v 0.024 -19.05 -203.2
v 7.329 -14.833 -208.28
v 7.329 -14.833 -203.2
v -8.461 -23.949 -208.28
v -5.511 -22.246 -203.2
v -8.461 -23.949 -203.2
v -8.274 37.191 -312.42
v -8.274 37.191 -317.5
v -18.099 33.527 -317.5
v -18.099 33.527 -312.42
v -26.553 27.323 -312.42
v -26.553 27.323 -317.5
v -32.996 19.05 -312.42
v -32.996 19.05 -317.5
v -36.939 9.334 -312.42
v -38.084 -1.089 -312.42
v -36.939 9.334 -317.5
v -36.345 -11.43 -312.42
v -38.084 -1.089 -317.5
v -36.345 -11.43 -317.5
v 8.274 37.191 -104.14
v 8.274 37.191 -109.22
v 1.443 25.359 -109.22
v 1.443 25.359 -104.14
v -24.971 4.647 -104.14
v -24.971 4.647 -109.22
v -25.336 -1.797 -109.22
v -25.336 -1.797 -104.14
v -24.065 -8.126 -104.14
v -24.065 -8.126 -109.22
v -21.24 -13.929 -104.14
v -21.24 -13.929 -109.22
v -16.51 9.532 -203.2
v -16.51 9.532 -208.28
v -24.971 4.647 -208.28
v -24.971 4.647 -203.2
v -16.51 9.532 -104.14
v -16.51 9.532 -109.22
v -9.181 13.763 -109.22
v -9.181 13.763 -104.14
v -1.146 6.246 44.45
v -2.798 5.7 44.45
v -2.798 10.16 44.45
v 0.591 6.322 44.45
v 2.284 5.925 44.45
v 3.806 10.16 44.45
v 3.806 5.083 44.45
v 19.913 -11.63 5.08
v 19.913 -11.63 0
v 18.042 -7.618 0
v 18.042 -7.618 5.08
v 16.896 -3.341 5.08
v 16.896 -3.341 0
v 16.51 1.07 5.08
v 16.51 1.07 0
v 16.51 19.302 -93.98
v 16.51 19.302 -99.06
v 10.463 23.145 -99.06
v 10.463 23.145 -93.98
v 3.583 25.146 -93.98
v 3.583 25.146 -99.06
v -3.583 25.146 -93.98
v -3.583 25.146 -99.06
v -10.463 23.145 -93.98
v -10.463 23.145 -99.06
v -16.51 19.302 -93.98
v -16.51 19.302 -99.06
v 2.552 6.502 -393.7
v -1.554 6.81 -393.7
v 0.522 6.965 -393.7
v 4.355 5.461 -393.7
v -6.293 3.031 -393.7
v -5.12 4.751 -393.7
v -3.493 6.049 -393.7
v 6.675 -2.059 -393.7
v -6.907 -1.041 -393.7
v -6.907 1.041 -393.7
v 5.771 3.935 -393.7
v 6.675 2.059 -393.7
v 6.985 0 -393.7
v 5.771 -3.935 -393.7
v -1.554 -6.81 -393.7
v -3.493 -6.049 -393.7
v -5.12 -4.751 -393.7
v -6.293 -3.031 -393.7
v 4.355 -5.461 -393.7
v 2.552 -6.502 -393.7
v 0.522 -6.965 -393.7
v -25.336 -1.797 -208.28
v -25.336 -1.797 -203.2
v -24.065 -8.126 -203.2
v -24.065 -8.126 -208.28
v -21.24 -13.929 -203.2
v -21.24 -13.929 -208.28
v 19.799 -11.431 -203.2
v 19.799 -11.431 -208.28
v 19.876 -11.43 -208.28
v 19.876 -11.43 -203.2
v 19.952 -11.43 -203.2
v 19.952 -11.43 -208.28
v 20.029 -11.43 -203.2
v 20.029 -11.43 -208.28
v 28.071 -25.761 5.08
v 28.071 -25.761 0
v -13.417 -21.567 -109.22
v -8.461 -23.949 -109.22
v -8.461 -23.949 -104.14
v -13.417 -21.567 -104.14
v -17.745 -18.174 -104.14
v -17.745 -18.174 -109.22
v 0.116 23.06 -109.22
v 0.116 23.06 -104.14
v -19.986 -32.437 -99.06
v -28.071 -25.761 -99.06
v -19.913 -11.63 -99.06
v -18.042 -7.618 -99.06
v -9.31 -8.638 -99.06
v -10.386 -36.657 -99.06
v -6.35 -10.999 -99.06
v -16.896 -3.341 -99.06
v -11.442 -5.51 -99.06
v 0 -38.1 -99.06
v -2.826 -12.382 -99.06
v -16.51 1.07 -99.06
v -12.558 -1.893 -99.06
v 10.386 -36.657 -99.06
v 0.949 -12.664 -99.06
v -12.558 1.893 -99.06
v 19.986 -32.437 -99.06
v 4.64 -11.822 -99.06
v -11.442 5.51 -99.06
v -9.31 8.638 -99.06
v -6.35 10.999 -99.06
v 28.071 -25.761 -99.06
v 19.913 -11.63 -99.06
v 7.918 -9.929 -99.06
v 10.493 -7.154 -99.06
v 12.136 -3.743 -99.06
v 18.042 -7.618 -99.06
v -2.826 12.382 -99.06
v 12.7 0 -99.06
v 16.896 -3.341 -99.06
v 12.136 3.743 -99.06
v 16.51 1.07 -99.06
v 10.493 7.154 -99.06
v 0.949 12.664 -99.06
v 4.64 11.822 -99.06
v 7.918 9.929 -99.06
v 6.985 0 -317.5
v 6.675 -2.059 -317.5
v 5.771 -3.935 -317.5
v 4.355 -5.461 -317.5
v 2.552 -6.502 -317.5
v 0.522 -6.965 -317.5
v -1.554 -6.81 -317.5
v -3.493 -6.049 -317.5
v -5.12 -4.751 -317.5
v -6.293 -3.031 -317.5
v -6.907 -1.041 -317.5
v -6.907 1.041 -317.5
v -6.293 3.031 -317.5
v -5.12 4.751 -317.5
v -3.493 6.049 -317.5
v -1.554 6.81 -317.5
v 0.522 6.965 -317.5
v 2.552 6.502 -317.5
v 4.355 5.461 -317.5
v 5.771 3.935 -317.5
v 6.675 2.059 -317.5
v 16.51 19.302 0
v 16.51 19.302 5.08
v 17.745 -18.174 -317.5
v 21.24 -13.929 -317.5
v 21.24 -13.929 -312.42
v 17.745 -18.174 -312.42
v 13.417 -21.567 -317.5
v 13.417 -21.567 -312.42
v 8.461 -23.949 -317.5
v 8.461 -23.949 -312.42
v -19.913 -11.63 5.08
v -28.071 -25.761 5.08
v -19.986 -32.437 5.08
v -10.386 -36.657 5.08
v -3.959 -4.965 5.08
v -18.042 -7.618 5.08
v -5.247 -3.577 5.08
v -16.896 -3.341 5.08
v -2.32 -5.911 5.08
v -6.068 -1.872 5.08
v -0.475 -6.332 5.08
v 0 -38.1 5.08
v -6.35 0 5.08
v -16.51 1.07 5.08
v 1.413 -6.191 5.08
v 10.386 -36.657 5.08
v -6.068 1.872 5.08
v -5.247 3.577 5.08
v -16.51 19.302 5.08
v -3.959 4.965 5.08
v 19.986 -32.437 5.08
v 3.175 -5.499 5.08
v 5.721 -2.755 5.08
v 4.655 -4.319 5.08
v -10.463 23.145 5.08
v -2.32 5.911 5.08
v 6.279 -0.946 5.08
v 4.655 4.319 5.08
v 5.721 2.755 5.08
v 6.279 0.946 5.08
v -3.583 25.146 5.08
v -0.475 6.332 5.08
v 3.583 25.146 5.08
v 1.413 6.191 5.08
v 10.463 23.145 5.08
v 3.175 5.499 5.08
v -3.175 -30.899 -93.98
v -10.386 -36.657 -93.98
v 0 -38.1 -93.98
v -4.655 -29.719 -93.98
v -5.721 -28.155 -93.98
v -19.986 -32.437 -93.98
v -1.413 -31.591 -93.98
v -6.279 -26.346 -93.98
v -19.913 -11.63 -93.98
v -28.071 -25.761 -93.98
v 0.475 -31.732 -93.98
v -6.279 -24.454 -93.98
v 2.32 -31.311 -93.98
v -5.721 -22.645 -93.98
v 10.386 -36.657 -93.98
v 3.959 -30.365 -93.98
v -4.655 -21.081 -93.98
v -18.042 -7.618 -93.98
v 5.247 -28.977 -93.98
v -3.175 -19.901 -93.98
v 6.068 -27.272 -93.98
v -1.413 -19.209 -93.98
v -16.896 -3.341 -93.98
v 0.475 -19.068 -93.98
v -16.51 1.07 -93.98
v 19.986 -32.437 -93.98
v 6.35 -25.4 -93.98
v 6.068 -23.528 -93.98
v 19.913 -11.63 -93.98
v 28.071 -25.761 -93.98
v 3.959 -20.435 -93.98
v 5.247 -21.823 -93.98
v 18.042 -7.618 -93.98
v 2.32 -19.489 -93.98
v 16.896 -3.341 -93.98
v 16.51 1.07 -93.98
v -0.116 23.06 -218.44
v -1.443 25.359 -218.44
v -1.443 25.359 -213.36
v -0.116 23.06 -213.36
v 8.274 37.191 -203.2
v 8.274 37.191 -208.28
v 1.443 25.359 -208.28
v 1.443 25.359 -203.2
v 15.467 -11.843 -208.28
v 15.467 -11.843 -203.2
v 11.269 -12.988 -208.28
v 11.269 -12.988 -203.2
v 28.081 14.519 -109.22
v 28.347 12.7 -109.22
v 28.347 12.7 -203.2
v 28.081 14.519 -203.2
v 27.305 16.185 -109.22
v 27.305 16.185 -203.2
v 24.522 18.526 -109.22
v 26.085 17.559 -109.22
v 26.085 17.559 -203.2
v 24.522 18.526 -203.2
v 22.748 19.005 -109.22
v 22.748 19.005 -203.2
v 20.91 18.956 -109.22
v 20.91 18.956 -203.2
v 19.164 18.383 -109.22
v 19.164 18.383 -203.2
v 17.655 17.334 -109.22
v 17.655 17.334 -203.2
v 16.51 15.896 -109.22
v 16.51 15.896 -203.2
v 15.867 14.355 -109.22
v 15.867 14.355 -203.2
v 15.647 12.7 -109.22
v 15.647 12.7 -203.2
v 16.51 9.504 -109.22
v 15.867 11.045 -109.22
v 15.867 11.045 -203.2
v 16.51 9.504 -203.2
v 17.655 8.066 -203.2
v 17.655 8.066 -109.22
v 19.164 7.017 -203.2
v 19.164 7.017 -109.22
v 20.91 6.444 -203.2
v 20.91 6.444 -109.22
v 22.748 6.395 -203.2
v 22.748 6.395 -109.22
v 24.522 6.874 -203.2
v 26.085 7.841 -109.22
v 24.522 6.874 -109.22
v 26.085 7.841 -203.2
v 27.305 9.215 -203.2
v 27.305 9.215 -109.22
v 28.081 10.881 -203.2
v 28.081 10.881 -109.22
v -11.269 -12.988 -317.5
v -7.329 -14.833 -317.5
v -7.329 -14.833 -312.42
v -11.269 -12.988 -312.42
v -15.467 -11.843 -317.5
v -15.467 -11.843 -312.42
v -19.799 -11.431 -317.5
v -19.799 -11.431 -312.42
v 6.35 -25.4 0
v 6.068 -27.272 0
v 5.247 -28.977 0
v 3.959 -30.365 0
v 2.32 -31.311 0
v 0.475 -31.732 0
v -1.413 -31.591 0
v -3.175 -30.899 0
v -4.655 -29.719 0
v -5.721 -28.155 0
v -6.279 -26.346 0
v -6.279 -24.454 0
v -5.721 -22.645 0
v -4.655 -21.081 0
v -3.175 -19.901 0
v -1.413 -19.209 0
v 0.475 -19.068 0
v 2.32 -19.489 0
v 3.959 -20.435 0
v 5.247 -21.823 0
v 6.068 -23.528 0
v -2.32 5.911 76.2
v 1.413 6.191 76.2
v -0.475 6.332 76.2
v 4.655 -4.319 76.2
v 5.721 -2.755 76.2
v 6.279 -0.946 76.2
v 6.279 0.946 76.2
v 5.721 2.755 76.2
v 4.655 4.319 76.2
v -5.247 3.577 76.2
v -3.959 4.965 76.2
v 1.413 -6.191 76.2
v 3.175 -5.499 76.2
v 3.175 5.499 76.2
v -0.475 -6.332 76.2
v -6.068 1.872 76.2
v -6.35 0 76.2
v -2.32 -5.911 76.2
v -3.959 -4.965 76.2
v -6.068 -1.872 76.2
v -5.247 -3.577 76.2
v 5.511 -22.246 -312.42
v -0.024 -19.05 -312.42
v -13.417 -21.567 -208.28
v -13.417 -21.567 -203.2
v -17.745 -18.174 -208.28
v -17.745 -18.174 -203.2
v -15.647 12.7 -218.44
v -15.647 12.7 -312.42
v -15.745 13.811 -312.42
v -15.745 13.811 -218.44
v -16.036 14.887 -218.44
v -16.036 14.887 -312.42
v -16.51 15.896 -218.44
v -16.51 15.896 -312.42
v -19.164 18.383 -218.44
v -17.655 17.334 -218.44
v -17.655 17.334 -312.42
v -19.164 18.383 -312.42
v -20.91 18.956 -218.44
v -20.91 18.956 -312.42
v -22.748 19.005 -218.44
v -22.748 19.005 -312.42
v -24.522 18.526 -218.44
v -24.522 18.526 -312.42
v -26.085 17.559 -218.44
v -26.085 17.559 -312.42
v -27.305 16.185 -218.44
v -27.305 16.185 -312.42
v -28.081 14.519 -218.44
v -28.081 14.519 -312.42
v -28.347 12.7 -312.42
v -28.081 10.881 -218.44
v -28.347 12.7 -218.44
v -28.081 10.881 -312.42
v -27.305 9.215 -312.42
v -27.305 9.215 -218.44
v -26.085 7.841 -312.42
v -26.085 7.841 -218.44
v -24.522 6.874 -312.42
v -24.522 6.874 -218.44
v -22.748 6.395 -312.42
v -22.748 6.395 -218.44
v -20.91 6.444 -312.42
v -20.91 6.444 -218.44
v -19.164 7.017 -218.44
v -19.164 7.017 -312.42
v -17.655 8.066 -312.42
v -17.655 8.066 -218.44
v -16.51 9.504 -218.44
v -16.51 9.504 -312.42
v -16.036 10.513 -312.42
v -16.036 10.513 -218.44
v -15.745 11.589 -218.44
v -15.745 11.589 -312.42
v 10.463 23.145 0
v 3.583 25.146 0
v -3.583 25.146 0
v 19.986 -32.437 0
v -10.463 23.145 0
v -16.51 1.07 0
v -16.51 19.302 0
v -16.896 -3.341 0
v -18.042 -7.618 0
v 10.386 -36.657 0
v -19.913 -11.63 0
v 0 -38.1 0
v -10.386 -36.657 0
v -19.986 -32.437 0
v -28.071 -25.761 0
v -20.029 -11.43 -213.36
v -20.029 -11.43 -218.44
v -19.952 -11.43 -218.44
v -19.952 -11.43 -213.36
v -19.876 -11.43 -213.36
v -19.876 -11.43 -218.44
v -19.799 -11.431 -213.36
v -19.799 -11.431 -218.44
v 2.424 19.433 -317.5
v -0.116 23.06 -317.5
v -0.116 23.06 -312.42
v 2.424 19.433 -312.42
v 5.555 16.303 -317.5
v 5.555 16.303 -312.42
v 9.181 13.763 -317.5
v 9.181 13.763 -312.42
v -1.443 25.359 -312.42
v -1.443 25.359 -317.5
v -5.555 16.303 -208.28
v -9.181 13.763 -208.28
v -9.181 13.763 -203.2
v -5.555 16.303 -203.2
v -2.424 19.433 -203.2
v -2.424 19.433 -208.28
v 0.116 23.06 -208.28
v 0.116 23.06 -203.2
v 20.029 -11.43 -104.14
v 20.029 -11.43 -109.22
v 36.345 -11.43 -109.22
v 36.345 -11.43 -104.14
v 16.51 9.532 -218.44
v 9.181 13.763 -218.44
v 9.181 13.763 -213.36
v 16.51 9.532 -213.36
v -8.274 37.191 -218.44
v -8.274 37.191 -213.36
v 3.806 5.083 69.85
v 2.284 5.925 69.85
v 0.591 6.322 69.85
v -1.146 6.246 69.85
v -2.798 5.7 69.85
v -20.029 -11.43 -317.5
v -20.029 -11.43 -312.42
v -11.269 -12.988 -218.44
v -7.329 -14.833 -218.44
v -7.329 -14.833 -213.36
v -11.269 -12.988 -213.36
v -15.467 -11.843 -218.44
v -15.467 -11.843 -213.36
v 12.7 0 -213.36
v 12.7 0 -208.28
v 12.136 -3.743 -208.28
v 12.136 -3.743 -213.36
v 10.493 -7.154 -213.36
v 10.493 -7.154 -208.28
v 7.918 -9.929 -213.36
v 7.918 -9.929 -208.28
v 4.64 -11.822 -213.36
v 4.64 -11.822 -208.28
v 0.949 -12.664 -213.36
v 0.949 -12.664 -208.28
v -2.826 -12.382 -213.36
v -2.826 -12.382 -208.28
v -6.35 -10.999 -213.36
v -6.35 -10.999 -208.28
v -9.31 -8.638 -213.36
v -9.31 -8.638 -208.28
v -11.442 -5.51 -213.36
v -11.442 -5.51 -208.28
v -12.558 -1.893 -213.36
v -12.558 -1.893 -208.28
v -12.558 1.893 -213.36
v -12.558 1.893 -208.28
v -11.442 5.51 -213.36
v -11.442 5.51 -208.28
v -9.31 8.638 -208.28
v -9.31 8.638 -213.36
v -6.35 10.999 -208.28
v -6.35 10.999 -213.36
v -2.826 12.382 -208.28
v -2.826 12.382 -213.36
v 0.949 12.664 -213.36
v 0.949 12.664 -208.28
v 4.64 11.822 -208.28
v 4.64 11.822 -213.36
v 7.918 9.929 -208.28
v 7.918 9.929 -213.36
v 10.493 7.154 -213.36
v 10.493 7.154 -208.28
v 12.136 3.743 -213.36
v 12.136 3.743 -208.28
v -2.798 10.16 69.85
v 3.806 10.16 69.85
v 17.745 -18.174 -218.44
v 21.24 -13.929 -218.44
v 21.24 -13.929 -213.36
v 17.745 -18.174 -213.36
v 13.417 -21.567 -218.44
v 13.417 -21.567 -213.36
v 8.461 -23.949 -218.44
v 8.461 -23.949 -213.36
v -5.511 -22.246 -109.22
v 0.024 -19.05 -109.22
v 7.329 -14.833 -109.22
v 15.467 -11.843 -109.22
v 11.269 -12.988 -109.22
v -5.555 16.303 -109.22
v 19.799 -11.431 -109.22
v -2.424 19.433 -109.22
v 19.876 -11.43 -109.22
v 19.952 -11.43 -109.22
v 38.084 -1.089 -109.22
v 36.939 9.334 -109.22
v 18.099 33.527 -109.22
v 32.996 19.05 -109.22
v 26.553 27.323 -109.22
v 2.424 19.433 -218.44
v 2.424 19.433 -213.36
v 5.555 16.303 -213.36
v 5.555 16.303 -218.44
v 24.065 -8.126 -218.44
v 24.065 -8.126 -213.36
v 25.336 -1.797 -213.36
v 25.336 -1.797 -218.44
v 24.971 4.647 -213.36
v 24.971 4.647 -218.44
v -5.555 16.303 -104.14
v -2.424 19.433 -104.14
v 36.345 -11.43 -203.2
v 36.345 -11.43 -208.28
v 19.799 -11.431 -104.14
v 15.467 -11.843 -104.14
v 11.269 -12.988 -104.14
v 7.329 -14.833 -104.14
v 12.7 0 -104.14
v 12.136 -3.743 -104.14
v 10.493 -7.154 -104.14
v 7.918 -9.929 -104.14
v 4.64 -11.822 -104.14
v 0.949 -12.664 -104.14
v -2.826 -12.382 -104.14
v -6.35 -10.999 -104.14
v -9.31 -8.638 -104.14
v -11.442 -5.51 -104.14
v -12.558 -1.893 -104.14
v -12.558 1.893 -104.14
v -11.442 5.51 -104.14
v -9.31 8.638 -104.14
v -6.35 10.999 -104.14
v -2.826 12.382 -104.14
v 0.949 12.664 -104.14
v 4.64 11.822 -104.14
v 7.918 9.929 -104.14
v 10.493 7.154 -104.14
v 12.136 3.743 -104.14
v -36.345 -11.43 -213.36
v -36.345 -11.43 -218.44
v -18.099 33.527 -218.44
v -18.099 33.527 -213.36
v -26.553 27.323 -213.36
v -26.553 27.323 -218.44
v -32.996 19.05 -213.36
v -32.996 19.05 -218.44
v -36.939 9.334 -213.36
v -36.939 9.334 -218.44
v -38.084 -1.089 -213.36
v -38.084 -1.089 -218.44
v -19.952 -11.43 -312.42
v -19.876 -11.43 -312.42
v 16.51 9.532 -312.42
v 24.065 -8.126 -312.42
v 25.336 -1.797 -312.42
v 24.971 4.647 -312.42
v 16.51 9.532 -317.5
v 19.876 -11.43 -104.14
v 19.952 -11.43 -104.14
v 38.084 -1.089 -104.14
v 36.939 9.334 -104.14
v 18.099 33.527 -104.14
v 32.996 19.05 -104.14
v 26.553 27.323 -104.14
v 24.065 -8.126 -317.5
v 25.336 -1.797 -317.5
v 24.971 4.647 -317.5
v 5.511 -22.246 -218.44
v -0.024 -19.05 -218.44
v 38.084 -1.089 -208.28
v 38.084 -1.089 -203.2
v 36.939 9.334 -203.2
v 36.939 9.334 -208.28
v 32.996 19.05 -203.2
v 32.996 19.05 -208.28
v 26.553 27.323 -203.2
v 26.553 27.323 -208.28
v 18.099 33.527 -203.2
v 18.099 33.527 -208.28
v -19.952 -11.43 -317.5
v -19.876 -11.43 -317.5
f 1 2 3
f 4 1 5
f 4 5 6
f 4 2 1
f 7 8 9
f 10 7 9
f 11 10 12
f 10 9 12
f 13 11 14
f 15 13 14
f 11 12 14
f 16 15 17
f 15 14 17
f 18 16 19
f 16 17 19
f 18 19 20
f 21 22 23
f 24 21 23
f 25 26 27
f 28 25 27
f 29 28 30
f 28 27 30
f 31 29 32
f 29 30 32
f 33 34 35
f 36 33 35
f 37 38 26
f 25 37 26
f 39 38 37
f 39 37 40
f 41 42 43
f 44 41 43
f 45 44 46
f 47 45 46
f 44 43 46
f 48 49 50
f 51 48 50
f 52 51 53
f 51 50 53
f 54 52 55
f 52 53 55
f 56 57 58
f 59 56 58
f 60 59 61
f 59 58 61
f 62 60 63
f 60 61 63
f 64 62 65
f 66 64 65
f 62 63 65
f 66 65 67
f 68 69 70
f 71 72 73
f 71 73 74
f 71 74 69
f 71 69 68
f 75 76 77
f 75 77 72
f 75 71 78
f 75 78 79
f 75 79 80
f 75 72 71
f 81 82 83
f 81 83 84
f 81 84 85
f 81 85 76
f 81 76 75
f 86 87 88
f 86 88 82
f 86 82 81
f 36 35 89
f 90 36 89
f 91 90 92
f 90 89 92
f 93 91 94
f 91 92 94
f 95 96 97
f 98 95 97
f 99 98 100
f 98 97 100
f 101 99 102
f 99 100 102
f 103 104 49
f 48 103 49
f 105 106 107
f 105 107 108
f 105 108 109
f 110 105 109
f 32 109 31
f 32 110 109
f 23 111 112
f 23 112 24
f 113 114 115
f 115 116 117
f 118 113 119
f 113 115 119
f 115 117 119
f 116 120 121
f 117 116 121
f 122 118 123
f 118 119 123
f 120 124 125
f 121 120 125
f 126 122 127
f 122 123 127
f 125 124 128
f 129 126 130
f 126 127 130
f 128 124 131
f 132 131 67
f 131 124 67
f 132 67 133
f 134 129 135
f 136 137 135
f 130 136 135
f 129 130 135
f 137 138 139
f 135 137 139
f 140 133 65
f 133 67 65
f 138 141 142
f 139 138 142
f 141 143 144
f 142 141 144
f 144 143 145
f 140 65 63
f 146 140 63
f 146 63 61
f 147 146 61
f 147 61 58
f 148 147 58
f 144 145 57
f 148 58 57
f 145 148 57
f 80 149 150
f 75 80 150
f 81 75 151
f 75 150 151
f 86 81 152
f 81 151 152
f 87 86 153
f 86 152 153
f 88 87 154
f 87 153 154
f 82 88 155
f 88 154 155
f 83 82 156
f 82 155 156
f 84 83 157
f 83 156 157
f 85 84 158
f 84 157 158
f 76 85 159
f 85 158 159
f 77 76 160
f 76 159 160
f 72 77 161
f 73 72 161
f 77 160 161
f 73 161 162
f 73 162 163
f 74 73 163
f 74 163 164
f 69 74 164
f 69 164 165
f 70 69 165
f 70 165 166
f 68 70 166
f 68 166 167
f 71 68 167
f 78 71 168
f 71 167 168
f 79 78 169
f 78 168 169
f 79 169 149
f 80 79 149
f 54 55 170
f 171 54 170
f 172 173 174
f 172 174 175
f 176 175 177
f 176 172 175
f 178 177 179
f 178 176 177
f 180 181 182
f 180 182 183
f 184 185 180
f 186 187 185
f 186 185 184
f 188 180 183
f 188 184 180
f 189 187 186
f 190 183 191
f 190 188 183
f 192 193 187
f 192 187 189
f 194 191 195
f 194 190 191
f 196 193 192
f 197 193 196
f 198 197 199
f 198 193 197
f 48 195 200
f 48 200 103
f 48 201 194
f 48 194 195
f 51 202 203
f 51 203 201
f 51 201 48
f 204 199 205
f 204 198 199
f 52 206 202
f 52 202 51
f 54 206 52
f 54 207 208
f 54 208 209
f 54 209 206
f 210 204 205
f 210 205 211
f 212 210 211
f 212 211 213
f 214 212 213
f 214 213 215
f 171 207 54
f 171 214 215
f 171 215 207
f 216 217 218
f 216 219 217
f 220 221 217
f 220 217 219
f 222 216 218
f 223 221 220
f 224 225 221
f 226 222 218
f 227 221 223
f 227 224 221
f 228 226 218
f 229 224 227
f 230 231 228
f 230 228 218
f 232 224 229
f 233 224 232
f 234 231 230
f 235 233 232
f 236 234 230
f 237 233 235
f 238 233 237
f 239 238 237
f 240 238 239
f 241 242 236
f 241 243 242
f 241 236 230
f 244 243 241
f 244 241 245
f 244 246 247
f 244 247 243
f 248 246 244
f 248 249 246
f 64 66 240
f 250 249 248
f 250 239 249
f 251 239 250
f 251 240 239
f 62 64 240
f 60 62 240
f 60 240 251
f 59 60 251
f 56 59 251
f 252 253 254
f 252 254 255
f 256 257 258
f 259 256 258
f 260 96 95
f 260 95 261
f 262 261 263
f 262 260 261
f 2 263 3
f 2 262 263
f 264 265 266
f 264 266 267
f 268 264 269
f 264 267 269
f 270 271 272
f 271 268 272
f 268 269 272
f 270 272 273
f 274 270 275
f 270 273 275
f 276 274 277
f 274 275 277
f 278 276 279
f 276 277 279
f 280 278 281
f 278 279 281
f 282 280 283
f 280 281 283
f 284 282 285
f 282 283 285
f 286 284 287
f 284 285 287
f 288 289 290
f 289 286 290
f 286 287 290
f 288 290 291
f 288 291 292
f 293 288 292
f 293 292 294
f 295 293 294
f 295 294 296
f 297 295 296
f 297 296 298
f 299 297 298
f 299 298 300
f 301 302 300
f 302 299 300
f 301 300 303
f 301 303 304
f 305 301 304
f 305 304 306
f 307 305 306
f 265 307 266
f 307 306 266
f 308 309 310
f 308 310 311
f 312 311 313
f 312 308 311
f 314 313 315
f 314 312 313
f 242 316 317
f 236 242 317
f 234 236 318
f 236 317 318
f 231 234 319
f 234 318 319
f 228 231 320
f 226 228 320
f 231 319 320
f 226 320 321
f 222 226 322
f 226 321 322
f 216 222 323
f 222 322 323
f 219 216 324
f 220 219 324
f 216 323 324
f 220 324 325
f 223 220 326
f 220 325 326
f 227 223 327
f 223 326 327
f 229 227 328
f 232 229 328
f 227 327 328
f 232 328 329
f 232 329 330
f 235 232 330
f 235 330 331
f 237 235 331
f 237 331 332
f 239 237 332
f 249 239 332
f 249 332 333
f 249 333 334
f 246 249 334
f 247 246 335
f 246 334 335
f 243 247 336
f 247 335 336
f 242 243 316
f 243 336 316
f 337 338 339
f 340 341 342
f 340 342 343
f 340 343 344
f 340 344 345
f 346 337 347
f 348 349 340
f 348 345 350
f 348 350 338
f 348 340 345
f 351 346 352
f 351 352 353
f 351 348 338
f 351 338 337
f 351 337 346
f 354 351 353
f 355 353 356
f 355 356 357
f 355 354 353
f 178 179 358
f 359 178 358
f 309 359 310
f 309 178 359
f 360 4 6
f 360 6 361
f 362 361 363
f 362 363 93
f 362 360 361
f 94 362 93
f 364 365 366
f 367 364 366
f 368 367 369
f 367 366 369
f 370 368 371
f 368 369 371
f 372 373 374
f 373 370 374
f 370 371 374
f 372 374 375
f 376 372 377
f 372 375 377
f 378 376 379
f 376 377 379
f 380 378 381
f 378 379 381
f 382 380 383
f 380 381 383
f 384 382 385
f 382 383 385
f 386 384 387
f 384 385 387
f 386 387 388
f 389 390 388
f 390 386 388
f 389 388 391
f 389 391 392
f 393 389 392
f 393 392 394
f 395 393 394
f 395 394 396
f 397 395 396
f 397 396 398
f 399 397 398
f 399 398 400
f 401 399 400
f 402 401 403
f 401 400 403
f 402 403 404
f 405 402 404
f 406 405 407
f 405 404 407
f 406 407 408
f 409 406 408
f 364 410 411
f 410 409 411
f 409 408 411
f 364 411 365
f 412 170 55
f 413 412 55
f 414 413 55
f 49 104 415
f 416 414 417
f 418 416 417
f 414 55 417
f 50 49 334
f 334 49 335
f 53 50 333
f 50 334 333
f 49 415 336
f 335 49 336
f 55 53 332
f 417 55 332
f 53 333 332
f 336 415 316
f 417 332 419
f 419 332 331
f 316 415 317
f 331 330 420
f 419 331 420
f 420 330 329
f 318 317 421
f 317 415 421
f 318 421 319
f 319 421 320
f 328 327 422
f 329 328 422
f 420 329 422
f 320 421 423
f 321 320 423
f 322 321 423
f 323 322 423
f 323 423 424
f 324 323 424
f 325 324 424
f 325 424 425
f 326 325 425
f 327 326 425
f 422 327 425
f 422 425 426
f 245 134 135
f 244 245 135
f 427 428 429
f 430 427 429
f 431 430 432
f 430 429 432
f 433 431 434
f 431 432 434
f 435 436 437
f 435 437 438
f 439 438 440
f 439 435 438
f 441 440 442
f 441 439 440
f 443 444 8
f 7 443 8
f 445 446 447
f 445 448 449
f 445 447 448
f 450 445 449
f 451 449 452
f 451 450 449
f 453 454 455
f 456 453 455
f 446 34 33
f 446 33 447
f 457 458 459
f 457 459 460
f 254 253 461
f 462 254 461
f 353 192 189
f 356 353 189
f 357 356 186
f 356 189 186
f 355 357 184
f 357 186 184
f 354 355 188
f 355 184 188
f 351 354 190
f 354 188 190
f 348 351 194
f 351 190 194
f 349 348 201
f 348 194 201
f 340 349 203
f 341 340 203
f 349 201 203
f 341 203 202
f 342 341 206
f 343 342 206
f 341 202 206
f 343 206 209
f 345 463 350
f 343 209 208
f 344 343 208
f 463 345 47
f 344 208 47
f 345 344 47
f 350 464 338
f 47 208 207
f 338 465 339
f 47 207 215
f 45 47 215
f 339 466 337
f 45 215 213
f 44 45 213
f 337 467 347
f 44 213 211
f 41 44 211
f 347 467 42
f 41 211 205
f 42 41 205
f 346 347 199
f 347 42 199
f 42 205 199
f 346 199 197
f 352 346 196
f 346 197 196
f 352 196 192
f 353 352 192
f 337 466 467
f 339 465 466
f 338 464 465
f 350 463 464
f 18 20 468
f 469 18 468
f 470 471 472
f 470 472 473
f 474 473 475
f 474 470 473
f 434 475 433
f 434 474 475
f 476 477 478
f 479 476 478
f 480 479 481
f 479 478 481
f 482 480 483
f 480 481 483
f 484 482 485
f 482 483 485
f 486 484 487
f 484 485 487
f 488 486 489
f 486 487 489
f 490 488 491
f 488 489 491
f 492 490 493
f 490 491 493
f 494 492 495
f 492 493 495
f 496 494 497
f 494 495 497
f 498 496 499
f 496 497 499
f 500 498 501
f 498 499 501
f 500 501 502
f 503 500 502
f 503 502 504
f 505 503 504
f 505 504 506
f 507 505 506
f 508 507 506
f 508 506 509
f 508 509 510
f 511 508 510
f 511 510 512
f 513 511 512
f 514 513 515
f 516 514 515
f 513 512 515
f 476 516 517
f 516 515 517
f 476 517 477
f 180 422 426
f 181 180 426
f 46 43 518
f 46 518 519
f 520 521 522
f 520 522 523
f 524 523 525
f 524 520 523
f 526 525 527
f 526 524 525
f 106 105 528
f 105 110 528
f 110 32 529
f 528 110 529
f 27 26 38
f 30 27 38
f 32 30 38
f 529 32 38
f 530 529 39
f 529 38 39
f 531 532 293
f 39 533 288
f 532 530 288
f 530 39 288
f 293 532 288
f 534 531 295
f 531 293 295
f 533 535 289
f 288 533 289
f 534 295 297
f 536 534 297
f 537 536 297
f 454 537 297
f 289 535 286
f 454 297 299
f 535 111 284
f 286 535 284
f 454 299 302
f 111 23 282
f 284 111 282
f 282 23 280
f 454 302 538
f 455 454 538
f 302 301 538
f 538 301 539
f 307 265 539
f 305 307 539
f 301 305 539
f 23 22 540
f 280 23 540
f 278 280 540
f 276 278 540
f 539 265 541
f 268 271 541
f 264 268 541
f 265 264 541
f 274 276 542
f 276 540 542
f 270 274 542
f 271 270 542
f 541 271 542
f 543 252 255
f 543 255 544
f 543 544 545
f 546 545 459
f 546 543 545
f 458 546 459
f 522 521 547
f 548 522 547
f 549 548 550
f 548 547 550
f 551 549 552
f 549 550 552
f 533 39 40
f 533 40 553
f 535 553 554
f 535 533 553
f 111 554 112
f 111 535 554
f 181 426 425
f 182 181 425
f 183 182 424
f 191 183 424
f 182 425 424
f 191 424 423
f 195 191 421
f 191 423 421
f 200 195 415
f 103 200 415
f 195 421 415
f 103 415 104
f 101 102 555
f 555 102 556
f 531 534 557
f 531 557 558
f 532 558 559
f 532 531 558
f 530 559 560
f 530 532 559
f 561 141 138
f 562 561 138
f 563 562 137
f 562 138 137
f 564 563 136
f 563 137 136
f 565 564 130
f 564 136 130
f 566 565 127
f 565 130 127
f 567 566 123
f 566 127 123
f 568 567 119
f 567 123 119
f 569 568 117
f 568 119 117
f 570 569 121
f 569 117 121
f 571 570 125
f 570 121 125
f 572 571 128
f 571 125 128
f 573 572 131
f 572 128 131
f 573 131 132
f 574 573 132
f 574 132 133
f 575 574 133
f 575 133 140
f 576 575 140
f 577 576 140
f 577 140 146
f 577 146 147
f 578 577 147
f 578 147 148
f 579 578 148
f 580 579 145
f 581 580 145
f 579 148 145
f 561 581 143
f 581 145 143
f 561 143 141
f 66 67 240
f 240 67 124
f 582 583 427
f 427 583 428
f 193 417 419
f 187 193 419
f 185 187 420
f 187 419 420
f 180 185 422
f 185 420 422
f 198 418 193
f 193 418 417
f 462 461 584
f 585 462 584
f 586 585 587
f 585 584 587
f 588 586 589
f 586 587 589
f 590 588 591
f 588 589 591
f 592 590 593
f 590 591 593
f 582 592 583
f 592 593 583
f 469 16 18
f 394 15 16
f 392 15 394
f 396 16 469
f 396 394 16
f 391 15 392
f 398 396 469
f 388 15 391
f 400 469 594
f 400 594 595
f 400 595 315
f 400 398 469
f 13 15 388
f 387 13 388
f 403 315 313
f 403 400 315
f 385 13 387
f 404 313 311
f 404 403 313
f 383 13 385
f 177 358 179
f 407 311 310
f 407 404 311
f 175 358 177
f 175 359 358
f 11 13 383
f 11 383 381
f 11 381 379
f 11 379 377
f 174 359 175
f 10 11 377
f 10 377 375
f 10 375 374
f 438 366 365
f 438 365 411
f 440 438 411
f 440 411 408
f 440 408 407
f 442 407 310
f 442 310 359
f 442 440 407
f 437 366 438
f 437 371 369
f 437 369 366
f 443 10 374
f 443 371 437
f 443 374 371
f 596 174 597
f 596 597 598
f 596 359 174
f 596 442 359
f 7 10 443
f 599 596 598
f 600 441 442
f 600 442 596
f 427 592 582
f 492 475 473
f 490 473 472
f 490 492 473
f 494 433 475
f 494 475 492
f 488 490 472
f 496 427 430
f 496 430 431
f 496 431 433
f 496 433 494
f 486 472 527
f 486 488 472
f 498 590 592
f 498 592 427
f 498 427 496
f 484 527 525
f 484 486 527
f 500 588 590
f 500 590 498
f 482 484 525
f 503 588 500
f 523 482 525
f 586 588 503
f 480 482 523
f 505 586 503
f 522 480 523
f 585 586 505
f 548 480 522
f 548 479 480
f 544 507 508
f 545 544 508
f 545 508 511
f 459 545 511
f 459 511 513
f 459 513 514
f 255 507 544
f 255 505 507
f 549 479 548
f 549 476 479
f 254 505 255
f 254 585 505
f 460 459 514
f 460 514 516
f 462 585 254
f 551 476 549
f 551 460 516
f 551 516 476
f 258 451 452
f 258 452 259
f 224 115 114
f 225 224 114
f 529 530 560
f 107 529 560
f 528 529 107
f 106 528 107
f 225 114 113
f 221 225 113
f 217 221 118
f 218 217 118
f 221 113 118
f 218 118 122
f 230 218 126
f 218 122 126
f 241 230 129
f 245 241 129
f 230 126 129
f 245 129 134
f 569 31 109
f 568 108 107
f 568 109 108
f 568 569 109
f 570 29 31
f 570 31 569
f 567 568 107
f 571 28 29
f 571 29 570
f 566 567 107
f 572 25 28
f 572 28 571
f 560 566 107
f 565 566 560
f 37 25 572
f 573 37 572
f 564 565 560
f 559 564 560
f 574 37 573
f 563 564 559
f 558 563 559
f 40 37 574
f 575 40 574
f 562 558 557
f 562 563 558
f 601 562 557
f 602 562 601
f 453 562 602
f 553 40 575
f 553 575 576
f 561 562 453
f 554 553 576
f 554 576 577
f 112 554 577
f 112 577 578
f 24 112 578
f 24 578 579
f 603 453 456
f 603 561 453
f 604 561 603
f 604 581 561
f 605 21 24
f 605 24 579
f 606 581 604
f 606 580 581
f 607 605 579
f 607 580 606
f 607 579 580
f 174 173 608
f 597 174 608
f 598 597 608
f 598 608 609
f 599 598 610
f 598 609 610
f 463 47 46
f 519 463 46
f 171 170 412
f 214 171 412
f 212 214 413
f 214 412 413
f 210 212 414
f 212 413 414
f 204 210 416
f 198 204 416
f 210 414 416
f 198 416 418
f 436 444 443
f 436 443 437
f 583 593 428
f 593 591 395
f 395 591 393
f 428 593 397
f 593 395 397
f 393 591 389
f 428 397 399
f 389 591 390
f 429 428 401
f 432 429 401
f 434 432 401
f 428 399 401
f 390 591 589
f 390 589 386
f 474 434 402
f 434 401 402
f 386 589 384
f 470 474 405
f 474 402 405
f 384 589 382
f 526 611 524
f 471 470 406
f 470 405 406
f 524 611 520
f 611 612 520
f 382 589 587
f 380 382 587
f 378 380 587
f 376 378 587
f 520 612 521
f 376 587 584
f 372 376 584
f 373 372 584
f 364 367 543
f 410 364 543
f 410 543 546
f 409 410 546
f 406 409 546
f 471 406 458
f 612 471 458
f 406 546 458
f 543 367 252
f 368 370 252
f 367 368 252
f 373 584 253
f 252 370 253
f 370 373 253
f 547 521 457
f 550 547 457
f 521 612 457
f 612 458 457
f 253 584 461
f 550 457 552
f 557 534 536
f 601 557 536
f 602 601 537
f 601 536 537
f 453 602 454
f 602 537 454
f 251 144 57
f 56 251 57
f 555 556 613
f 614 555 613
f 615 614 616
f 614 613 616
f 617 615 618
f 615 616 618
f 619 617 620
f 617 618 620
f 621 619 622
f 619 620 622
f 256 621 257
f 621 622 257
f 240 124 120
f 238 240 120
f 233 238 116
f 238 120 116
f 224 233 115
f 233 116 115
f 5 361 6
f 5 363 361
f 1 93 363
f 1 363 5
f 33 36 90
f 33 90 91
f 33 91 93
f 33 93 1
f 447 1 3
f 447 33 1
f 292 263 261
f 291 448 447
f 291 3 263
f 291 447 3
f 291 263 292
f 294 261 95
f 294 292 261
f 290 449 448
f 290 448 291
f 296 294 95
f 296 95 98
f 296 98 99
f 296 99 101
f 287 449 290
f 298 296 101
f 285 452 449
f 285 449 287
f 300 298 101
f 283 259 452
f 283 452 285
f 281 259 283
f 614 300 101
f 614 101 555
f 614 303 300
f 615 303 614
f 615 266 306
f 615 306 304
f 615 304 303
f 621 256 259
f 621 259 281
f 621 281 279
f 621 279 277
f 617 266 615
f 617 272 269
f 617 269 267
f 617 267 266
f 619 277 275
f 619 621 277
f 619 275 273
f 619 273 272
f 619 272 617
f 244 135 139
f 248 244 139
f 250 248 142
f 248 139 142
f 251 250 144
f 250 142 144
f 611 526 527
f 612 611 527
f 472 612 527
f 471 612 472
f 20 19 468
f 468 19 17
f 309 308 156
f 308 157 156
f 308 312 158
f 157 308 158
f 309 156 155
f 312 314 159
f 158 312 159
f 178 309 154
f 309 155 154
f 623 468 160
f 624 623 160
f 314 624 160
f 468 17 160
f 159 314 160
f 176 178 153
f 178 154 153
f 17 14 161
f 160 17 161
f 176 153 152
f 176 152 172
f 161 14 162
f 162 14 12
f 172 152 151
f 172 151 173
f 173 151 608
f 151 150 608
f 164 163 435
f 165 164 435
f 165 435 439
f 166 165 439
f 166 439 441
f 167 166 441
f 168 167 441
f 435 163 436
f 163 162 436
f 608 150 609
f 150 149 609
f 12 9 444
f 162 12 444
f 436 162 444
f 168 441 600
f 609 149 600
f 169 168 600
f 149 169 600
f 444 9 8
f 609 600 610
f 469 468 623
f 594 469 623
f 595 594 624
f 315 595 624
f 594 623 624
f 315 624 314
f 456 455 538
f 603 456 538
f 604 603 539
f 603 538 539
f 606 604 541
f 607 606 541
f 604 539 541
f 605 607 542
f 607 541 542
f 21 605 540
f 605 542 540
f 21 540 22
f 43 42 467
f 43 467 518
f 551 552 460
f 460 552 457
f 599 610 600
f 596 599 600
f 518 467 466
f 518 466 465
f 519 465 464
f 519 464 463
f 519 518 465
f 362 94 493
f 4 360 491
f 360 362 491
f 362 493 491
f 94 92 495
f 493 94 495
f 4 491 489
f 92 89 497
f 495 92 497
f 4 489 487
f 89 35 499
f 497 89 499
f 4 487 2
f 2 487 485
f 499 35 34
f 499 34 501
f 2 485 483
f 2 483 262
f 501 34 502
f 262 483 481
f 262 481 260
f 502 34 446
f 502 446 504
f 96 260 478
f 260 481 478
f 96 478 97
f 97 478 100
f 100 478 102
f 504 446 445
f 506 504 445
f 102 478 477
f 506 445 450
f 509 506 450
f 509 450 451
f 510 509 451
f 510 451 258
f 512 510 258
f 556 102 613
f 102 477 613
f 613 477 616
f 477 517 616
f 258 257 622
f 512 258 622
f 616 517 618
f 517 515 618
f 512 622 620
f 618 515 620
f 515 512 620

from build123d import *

# Parameters (mm, degrees)
BOSS_EXTRUDE1_DEPTH    = 5.08
SKETCH2_R              = 6.35
BOSS_EXTRUDE2_DEPTH    = 76.2
BOSS_EXTRUDE3_START    = 44.45
SKETCH3_W              = 6.604
SKETCH3_H              = 6.975666606
BOSS_EXTRUDE3_DEPTH    = 25.4
SKETCH4_R              = 6.35
BOSS_EXTRUDE4_DEPTH    = 93.98
LPATTERN1_COUNT        = 2
LPATTERN1_PITCH        = 99.06
SKETCH5_R              = 12.7
BOSS_EXTRUDE5_DEPTH    = 5.08
LPATTERN2_COUNT        = 2
LPATTERN2_PITCH        = 109.22
LPATTERN2_COPY_1_DEPTH = 5.08
MOVE_START             = -208.28
MOVE_FACE1_DEPTH       = 104.14
MOVE_START_2           = -203.2
MOVE_FACE1_2_DEPTH     = 93.98
MOVE_FACE1_3_OUTLINE_R = 6.35
MOVE_FACE1_3_DEPTH     = 104.14
MOVE_FACE1_4_DEPTH     = 5.08
MOVE_START_3           = -109.22
MOVE_FACE1_5_DEPTH     = 5.08
LPATTERN3_COUNT        = 2
LPATTERN3_PITCH        = 218.44
LPATTERN3_COPY_1_DEPTH = 5.08
MOVE_START_4           = -317.5
MOVE_FACE2_DEPTH       = 104.14
MOVE_START_5           = -312.42
MOVE_FACE2_2_DEPTH     = 93.98
MOVE_FACE2_3_OUTLINE_R = 6.35
MOVE_FACE2_3_DEPTH     = 104.14
MOVE_FACE2_4_DEPTH     = 5.08
MOVE_START_6           = -218.44
MOVE_FACE2_5_DEPTH     = 5.08
SKETCH6_R              = 6.985
BOSS_EXTRUDE6_DEPTH    = 76.2


# Read off the part's stored shape, not the designer's step: Move Face1, Move Face2
with BuildPart() as part:
    # Sketch1 → Boss-Extrude1 (new body)
    with BuildSketch(Plane.XY):
        with BuildLine():
            Line((28.071212152, -25.760765678), (19.912954744, -11.630249345))
            ThreePointArc((19.912954744, -11.630249345), (17.375484012, -5.504253091), (16.51, 1.069750655))
            Line((16.51, 1.069750655), (16.51, 19.302328875))
            ThreePointArc((16.51, 19.302328875), (0, 25.4), (-16.51, 19.302328875))
            Line((-16.51, 19.302328875), (-16.51, 1.069750655))
            ThreePointArc((-16.51, 1.069750655), (-17.375484012, -5.504253091), (-19.912954744, -11.630249345))
            Line((-19.912954744, -11.630249345), (-28.071212152, -25.760765678))
            ThreePointArc((-28.071212152, -25.760765678), (0, -38.1), (28.071212152, -25.760765678))
        make_face()
    boss_extrude1 = extrude(amount=BOSS_EXTRUDE1_DEPTH)

    # Sketch2 → Boss-Extrude2 (add)
    with BuildSketch(Plane.XY):
        with Locations(Location((0, 0, 0), (0, 0, 180))):
            Circle(SKETCH2_R)
    extrude(amount=BOSS_EXTRUDE2_DEPTH)

    # Sketch3 → Boss-Extrude3 (add)
    with BuildSketch(Plane.XY.offset(BOSS_EXTRUDE3_START)):
        with Locations((0.504239379, 6.672166697)):
            Rectangle(SKETCH3_W, SKETCH3_H)
    extrude(amount=BOSS_EXTRUDE3_DEPTH)

    # Sketch4 → Boss-Extrude4 (add)
    with BuildSketch(Plane(origin=(0, 0, 0), x_dir=(-1, 0, 0), z_dir=(0, 0, -1))):
        with Locations(Location((0, -25.4, 0), (0, 0, 180))):
            Circle(SKETCH4_R)
    boss_extrude4 = extrude(amount=BOSS_EXTRUDE4_DEPTH)

    # LPattern1: Boss-Extrude1 ×2
    with Locations(*[(0, 0, -i * LPATTERN1_PITCH) for i in range(1, LPATTERN1_COUNT)]):
        add(boss_extrude1)

    # Sketch5 → Boss-Extrude5 (add)
    with BuildSketch(Plane(origin=(0, 0, -99.06), x_dir=(-1, 0, 0), z_dir=(0, 0, -1))):
        with Locations(Location((0, 0, 0), (0, 0, 180))):
            Circle(SKETCH5_R)
    boss_extrude5 = extrude(amount=BOSS_EXTRUDE5_DEPTH)

    # LPattern2: Boss-Extrude1, Boss-Extrude4, Boss-Extrude5 ×2
    with Locations(*[(0, 0, -i * LPATTERN2_PITCH) for i in range(1, LPATTERN2_COUNT)]):
        add(boss_extrude1)
        add(boss_extrude4)
        add(boss_extrude5)

    # LPattern2 copy 1 sketch → LPattern2 copy 1 (add)
    with BuildSketch(Plane.XY.offset(-208.28)):
        with BuildLine():
            Line((28.071212152, -25.760765678), (19.912954744, -11.630249345))
            ThreePointArc((19.912954744, -11.630249345), (17.375484012, -5.504253091), (16.51, 1.069750655))
            Line((16.51, 1.069750655), (16.51, 19.302328875))
            ThreePointArc((16.51, 19.302328875), (0, 25.4), (-16.51, 19.302328875))
            Line((-16.51, 19.302328875), (-16.51, 1.069750655))
            ThreePointArc((-16.51, 1.069750655), (-17.375484012, -5.504253091), (-19.912954744, -11.630249345))
            Line((-19.912954744, -11.630249345), (-28.071212152, -25.760765678))
            ThreePointArc((-28.071212152, -25.760765678), (0, -38.1), (28.071212152, -25.760765678))
        make_face()
    extrude(amount=LPATTERN2_COPY_1_DEPTH)

    # Move Face1 outline → Move Face1 (cut)
    with BuildSketch(Plane.XY.offset(MOVE_START)):
        with BuildLine():
            Line((0.115614013, 23.060249345), (1.442792283, 25.358989539))
            ThreePointArc((1.442792283, 25.358989539), (-8.119480999, 24.067281282), (-16.51, 19.302328875))
            Line((-16.51, 19.302328875), (-16.51, 9.532052944))
            Line((-16.51, 9.532052944), (-9.181431243, 13.763204089))
            ThreePointArc((-9.181431243, 13.763204089), (-3.920919001, 17.799737103), (0.115614013, 23.060249345))
        make_face()
        with BuildLine():
            ThreePointArc((19.912954744, -11.630249345), (19.855820207, -11.530771305), (19.79913554, -11.431036234))
            ThreePointArc((19.79913554, -11.431036234), (13.343823196, -12.325425391), (7.328568757, -14.832954744))
            Line((7.328568757, -14.832954744), (-8.461307158, -23.949243854))
            ThreePointArc((-8.461307158, -23.949243854), (-15.673074402, -19.987864788), (-21.240133013, -13.928989539))
            Line((-21.240133013, -13.928989539), (-28.071212152, -25.760765678))
            ThreePointArc((-28.071212152, -25.760765678), (0, -38.1), (28.071212152, -25.760765678))
            Line((28.071212152, -25.760765678), (19.912954744, -11.630249345))
        make_face()
    extrude(amount=MOVE_FACE1_DEPTH, mode=Mode.SUBTRACT)

    # Move Face1 2 outline → Move Face1 2 (cut)
    with BuildSketch(Plane.XY.offset(MOVE_START_2)):
        with BuildLine():
            Line((-5.511396499, -22.246112141), (0.024351243, -19.050046692))
            ThreePointArc((0.024351243, -19.050046692), (-3.175, -19.900738686), (-5.511396499, -22.246112141))
        make_face()
    extrude(amount=MOVE_FACE1_2_DEPTH, mode=Mode.SUBTRACT)

    # Move Face1 3 outline → Move Face1 3 (add)
    with BuildSketch(Plane.XY.offset(MOVE_START)):
        with Locations((21.997045256, 12.7)):
            Circle(MOVE_FACE1_3_OUTLINE_R)
    extrude(amount=MOVE_FACE1_3_DEPTH)

    # Move Face1 4 outline → Move Face1 4 (add)
    with BuildSketch(Plane.XY.offset(MOVE_START)):
        with BuildLine():
            ThreePointArc((36.345083574, -11.43), (32.995567884, 19.05), (8.273871422, 37.190765678))
            Line((8.273871422, 37.190765678), (1.442792283, 25.358989539))
            ThreePointArc((1.442792283, 25.358989539), (9.473461473, 23.567212981), (16.51, 19.302328875))
            Line((16.51, 19.302328875), (16.51, 15.89606545))
            ThreePointArc((16.51, 15.89606545), (28.347045256, 12.7), (16.51, 9.50393455))
            Line((16.51, 9.50393455), (16.51, 1.069750655))
            ThreePointArc((16.51, 1.069750655), (17.346043099, -5.393377176), (19.79913554, -11.431036234))
            ThreePointArc((19.79913554, -11.431036234), (19.913850979, -11.43025906), (20.028568757, -11.43))
            Line((20.028568757, -11.43), (36.345083574, -11.43))
        make_face()
        with BuildLine():
            Line((-16.51, 1.069750655), (-16.51, 9.532052944))
            Line((-16.51, 9.532052944), (-24.971307158, 4.646914979))
            ThreePointArc((-24.971307158, 4.646914979), (-24.90261749, -5.00196383), (-21.240133013, -13.928989539))
            Line((-21.240133013, -13.928989539), (-19.912954744, -11.630249345))
            ThreePointArc((-19.912954744, -11.630249345), (-17.375484012, -5.504253091), (-16.51, 1.069750655))
        make_face()
    extrude(amount=MOVE_FACE1_4_DEPTH)

    # Move Face1 5 outline → Move Face1 5 (add)
    with BuildSketch(Plane.XY.offset(MOVE_START_3)):
        with BuildLine():
            ThreePointArc((36.345083574, -11.43), (32.995567884, 19.05), (8.273871422, 37.190765678))
            Line((8.273871422, 37.190765678), (1.442792283, 25.358989539))
            ThreePointArc((1.442792283, 25.358989539), (9.473461473, 23.567212981), (16.51, 19.302328875))
            Line((16.51, 19.302328875), (16.51, 15.89606545))
            ThreePointArc((16.51, 15.89606545), (28.347045256, 12.7), (16.51, 9.50393455))
            Line((16.51, 9.50393455), (16.51, 1.069750655))
            ThreePointArc((16.51, 1.069750655), (17.346043099, -5.393377176), (19.79913554, -11.431036234))
            ThreePointArc((19.79913554, -11.431036234), (19.913850979, -11.43025906), (20.028568757, -11.43))
            Line((20.028568757, -11.43), (36.345083574, -11.43))
        make_face()
        with BuildLine():
            Line((-16.51, 1.069750655), (-16.51, 9.532052944))
            Line((-16.51, 9.532052944), (-24.971307158, 4.646914979))
            ThreePointArc((-24.971307158, 4.646914979), (-24.90261749, -5.00196383), (-21.240133013, -13.928989539))
            Line((-21.240133013, -13.928989539), (-19.912954744, -11.630249345))
            ThreePointArc((-19.912954744, -11.630249345), (-17.375484012, -5.504253091), (-16.51, 1.069750655))
        make_face()
    extrude(amount=MOVE_FACE1_5_DEPTH)

    # LPattern3: Boss-Extrude1, Boss-Extrude4 ×2
    with Locations(*[(0, 0, -i * LPATTERN3_PITCH) for i in range(1, LPATTERN3_COUNT)]):
        add(boss_extrude1)
        add(boss_extrude4)

    # LPattern3 copy 1 sketch → LPattern3 copy 1 (add)
    with BuildSketch(Plane.XY.offset(-317.5)):
        with BuildLine():
            Line((28.071212152, -25.760765678), (19.912954744, -11.630249345))
            ThreePointArc((19.912954744, -11.630249345), (17.375484012, -5.504253091), (16.51, 1.069750655))
            Line((16.51, 1.069750655), (16.51, 19.302328875))
            ThreePointArc((16.51, 19.302328875), (0, 25.4), (-16.51, 19.302328875))
            Line((-16.51, 19.302328875), (-16.51, 1.069750655))
            ThreePointArc((-16.51, 1.069750655), (-17.375484012, -5.504253091), (-19.912954744, -11.630249345))
            Line((-19.912954744, -11.630249345), (-28.071212152, -25.760765678))
            ThreePointArc((-28.071212152, -25.760765678), (0, -38.1), (28.071212152, -25.760765678))
        make_face()
    extrude(amount=LPATTERN3_COPY_1_DEPTH)

    # Move Face2 outline → Move Face2 (cut)
    with BuildSketch(Plane.XY.offset(MOVE_START_4)):
        with BuildLine():
            ThreePointArc((16.51, 19.302328875), (8.119480999, 24.067281282), (-1.442792283, 25.358989539))
            Line((-1.442792283, 25.358989539), (-0.115614013, 23.060249345))
            ThreePointArc((-0.115614013, 23.060249345), (3.920919001, 17.799737103), (9.181431243, 13.763204089))
            Line((9.181431243, 13.763204089), (16.51, 9.532052944))
            Line((16.51, 9.532052944), (16.51, 19.302328875))
        make_face()
        with BuildLine():
            ThreePointArc((-7.328568757, -14.832954744), (-13.343823196, -12.325425391), (-19.79913554, -11.431036234))
            ThreePointArc((-19.79913554, -11.431036234), (-19.855820207, -11.530771305), (-19.912954744, -11.630249345))
            Line((-19.912954744, -11.630249345), (-28.071212152, -25.760765678))
            ThreePointArc((-28.071212152, -25.760765678), (0, -38.1), (28.071212152, -25.760765678))
            Line((28.071212152, -25.760765678), (21.240133013, -13.928989539))
            ThreePointArc((21.240133013, -13.928989539), (15.673074402, -19.987864788), (8.461307158, -23.949243854))
            Line((8.461307158, -23.949243854), (-7.328568757, -14.832954744))
        make_face()
    extrude(amount=MOVE_FACE2_DEPTH, mode=Mode.SUBTRACT)

    # Move Face2 2 outline → Move Face2 2 (cut)
    with BuildSketch(Plane.XY.offset(MOVE_START_5)):
        with BuildLine():
            ThreePointArc((5.511396499, -22.246112141), (3.175, -19.900738686), (-0.024351243, -19.050046692))
            Line((-0.024351243, -19.050046692), (5.511396499, -22.246112141))
        make_face()
    extrude(amount=MOVE_FACE2_2_DEPTH, mode=Mode.SUBTRACT)

    # Move Face2 3 outline → Move Face2 3 (add)
    with BuildSketch(Plane.XY.offset(MOVE_START_4)):
        with Locations((-21.997045256, 12.7)):
            Circle(MOVE_FACE2_3_OUTLINE_R)
    extrude(amount=MOVE_FACE2_3_DEPTH)

    # Move Face2 4 outline → Move Face2 4 (add)
    with BuildSketch(Plane.XY.offset(MOVE_START_4)):
        with BuildLine():
            ThreePointArc((-8.273871422, 37.190765678), (-32.995567884, 19.05), (-36.345083574, -11.43))
            Line((-36.345083574, -11.43), (-20.028568757, -11.43))
            ThreePointArc((-20.028568757, -11.43), (-19.913850979, -11.43025906), (-19.79913554, -11.431036234))
            ThreePointArc((-19.79913554, -11.431036234), (-17.346043099, -5.393377176), (-16.51, 1.069750655))
            Line((-16.51, 1.069750655), (-16.51, 9.50393455))
            ThreePointArc((-16.51, 9.50393455), (-28.347045256, 12.7), (-16.51, 15.89606545))
            Line((-16.51, 15.89606545), (-16.51, 19.302328875))
            ThreePointArc((-16.51, 19.302328875), (-9.473461473, 23.567212981), (-1.442792283, 25.358989539))
            Line((-1.442792283, 25.358989539), (-8.273871422, 37.190765678))
        make_face()
        with BuildLine():
            Line((24.971307158, 4.646914979), (16.51, 9.532052944))
            Line((16.51, 9.532052944), (16.51, 1.069750655))
            ThreePointArc((16.51, 1.069750655), (17.375484012, -5.504253091), (19.912954744, -11.630249345))
            Line((19.912954744, -11.630249345), (21.240133013, -13.928989539))
            ThreePointArc((21.240133013, -13.928989539), (24.90261749, -5.00196383), (24.971307158, 4.646914979))
        make_face()
    extrude(amount=MOVE_FACE2_4_DEPTH)

    # Move Face2 5 outline → Move Face2 5 (add)
    with BuildSketch(Plane.XY.offset(MOVE_START_6)):
        with BuildLine():
            ThreePointArc((-8.273871422, 37.190765678), (-32.995567884, 19.05), (-36.345083574, -11.43))
            Line((-36.345083574, -11.43), (-20.028568757, -11.43))
            ThreePointArc((-20.028568757, -11.43), (-19.913850979, -11.43025906), (-19.79913554, -11.431036234))
            ThreePointArc((-19.79913554, -11.431036234), (-17.346043099, -5.393377176), (-16.51, 1.069750655))
            Line((-16.51, 1.069750655), (-16.51, 9.50393455))
            ThreePointArc((-16.51, 9.50393455), (-28.347045256, 12.7), (-16.51, 15.89606545))
            Line((-16.51, 15.89606545), (-16.51, 19.302328875))
            ThreePointArc((-16.51, 19.302328875), (-9.473461473, 23.567212981), (-1.442792283, 25.358989539))
            Line((-1.442792283, 25.358989539), (-8.273871422, 37.190765678))
        make_face()
        with BuildLine():
            Line((24.971307158, 4.646914979), (16.51, 9.532052944))
            Line((16.51, 9.532052944), (16.51, 1.069750655))
            ThreePointArc((16.51, 1.069750655), (17.375484012, -5.504253091), (19.912954744, -11.630249345))
            Line((19.912954744, -11.630249345), (21.240133013, -13.928989539))
            ThreePointArc((21.240133013, -13.928989539), (24.90261749, -5.00196383), (24.971307158, 4.646914979))
        make_face()
    extrude(amount=MOVE_FACE2_5_DEPTH)

    # Sketch6 → Boss-Extrude6 (add)
    with BuildSketch(Plane(origin=(0, 0, -317.5), x_dir=(-1, 0, 0), z_dir=(0, 0, -1))):
        with Locations(Location((0, 0, 0), (0, 0, 180))):
            Circle(SKETCH6_R)
    extrude(amount=BOSS_EXTRUDE6_DEPTH)


solid = part.part
